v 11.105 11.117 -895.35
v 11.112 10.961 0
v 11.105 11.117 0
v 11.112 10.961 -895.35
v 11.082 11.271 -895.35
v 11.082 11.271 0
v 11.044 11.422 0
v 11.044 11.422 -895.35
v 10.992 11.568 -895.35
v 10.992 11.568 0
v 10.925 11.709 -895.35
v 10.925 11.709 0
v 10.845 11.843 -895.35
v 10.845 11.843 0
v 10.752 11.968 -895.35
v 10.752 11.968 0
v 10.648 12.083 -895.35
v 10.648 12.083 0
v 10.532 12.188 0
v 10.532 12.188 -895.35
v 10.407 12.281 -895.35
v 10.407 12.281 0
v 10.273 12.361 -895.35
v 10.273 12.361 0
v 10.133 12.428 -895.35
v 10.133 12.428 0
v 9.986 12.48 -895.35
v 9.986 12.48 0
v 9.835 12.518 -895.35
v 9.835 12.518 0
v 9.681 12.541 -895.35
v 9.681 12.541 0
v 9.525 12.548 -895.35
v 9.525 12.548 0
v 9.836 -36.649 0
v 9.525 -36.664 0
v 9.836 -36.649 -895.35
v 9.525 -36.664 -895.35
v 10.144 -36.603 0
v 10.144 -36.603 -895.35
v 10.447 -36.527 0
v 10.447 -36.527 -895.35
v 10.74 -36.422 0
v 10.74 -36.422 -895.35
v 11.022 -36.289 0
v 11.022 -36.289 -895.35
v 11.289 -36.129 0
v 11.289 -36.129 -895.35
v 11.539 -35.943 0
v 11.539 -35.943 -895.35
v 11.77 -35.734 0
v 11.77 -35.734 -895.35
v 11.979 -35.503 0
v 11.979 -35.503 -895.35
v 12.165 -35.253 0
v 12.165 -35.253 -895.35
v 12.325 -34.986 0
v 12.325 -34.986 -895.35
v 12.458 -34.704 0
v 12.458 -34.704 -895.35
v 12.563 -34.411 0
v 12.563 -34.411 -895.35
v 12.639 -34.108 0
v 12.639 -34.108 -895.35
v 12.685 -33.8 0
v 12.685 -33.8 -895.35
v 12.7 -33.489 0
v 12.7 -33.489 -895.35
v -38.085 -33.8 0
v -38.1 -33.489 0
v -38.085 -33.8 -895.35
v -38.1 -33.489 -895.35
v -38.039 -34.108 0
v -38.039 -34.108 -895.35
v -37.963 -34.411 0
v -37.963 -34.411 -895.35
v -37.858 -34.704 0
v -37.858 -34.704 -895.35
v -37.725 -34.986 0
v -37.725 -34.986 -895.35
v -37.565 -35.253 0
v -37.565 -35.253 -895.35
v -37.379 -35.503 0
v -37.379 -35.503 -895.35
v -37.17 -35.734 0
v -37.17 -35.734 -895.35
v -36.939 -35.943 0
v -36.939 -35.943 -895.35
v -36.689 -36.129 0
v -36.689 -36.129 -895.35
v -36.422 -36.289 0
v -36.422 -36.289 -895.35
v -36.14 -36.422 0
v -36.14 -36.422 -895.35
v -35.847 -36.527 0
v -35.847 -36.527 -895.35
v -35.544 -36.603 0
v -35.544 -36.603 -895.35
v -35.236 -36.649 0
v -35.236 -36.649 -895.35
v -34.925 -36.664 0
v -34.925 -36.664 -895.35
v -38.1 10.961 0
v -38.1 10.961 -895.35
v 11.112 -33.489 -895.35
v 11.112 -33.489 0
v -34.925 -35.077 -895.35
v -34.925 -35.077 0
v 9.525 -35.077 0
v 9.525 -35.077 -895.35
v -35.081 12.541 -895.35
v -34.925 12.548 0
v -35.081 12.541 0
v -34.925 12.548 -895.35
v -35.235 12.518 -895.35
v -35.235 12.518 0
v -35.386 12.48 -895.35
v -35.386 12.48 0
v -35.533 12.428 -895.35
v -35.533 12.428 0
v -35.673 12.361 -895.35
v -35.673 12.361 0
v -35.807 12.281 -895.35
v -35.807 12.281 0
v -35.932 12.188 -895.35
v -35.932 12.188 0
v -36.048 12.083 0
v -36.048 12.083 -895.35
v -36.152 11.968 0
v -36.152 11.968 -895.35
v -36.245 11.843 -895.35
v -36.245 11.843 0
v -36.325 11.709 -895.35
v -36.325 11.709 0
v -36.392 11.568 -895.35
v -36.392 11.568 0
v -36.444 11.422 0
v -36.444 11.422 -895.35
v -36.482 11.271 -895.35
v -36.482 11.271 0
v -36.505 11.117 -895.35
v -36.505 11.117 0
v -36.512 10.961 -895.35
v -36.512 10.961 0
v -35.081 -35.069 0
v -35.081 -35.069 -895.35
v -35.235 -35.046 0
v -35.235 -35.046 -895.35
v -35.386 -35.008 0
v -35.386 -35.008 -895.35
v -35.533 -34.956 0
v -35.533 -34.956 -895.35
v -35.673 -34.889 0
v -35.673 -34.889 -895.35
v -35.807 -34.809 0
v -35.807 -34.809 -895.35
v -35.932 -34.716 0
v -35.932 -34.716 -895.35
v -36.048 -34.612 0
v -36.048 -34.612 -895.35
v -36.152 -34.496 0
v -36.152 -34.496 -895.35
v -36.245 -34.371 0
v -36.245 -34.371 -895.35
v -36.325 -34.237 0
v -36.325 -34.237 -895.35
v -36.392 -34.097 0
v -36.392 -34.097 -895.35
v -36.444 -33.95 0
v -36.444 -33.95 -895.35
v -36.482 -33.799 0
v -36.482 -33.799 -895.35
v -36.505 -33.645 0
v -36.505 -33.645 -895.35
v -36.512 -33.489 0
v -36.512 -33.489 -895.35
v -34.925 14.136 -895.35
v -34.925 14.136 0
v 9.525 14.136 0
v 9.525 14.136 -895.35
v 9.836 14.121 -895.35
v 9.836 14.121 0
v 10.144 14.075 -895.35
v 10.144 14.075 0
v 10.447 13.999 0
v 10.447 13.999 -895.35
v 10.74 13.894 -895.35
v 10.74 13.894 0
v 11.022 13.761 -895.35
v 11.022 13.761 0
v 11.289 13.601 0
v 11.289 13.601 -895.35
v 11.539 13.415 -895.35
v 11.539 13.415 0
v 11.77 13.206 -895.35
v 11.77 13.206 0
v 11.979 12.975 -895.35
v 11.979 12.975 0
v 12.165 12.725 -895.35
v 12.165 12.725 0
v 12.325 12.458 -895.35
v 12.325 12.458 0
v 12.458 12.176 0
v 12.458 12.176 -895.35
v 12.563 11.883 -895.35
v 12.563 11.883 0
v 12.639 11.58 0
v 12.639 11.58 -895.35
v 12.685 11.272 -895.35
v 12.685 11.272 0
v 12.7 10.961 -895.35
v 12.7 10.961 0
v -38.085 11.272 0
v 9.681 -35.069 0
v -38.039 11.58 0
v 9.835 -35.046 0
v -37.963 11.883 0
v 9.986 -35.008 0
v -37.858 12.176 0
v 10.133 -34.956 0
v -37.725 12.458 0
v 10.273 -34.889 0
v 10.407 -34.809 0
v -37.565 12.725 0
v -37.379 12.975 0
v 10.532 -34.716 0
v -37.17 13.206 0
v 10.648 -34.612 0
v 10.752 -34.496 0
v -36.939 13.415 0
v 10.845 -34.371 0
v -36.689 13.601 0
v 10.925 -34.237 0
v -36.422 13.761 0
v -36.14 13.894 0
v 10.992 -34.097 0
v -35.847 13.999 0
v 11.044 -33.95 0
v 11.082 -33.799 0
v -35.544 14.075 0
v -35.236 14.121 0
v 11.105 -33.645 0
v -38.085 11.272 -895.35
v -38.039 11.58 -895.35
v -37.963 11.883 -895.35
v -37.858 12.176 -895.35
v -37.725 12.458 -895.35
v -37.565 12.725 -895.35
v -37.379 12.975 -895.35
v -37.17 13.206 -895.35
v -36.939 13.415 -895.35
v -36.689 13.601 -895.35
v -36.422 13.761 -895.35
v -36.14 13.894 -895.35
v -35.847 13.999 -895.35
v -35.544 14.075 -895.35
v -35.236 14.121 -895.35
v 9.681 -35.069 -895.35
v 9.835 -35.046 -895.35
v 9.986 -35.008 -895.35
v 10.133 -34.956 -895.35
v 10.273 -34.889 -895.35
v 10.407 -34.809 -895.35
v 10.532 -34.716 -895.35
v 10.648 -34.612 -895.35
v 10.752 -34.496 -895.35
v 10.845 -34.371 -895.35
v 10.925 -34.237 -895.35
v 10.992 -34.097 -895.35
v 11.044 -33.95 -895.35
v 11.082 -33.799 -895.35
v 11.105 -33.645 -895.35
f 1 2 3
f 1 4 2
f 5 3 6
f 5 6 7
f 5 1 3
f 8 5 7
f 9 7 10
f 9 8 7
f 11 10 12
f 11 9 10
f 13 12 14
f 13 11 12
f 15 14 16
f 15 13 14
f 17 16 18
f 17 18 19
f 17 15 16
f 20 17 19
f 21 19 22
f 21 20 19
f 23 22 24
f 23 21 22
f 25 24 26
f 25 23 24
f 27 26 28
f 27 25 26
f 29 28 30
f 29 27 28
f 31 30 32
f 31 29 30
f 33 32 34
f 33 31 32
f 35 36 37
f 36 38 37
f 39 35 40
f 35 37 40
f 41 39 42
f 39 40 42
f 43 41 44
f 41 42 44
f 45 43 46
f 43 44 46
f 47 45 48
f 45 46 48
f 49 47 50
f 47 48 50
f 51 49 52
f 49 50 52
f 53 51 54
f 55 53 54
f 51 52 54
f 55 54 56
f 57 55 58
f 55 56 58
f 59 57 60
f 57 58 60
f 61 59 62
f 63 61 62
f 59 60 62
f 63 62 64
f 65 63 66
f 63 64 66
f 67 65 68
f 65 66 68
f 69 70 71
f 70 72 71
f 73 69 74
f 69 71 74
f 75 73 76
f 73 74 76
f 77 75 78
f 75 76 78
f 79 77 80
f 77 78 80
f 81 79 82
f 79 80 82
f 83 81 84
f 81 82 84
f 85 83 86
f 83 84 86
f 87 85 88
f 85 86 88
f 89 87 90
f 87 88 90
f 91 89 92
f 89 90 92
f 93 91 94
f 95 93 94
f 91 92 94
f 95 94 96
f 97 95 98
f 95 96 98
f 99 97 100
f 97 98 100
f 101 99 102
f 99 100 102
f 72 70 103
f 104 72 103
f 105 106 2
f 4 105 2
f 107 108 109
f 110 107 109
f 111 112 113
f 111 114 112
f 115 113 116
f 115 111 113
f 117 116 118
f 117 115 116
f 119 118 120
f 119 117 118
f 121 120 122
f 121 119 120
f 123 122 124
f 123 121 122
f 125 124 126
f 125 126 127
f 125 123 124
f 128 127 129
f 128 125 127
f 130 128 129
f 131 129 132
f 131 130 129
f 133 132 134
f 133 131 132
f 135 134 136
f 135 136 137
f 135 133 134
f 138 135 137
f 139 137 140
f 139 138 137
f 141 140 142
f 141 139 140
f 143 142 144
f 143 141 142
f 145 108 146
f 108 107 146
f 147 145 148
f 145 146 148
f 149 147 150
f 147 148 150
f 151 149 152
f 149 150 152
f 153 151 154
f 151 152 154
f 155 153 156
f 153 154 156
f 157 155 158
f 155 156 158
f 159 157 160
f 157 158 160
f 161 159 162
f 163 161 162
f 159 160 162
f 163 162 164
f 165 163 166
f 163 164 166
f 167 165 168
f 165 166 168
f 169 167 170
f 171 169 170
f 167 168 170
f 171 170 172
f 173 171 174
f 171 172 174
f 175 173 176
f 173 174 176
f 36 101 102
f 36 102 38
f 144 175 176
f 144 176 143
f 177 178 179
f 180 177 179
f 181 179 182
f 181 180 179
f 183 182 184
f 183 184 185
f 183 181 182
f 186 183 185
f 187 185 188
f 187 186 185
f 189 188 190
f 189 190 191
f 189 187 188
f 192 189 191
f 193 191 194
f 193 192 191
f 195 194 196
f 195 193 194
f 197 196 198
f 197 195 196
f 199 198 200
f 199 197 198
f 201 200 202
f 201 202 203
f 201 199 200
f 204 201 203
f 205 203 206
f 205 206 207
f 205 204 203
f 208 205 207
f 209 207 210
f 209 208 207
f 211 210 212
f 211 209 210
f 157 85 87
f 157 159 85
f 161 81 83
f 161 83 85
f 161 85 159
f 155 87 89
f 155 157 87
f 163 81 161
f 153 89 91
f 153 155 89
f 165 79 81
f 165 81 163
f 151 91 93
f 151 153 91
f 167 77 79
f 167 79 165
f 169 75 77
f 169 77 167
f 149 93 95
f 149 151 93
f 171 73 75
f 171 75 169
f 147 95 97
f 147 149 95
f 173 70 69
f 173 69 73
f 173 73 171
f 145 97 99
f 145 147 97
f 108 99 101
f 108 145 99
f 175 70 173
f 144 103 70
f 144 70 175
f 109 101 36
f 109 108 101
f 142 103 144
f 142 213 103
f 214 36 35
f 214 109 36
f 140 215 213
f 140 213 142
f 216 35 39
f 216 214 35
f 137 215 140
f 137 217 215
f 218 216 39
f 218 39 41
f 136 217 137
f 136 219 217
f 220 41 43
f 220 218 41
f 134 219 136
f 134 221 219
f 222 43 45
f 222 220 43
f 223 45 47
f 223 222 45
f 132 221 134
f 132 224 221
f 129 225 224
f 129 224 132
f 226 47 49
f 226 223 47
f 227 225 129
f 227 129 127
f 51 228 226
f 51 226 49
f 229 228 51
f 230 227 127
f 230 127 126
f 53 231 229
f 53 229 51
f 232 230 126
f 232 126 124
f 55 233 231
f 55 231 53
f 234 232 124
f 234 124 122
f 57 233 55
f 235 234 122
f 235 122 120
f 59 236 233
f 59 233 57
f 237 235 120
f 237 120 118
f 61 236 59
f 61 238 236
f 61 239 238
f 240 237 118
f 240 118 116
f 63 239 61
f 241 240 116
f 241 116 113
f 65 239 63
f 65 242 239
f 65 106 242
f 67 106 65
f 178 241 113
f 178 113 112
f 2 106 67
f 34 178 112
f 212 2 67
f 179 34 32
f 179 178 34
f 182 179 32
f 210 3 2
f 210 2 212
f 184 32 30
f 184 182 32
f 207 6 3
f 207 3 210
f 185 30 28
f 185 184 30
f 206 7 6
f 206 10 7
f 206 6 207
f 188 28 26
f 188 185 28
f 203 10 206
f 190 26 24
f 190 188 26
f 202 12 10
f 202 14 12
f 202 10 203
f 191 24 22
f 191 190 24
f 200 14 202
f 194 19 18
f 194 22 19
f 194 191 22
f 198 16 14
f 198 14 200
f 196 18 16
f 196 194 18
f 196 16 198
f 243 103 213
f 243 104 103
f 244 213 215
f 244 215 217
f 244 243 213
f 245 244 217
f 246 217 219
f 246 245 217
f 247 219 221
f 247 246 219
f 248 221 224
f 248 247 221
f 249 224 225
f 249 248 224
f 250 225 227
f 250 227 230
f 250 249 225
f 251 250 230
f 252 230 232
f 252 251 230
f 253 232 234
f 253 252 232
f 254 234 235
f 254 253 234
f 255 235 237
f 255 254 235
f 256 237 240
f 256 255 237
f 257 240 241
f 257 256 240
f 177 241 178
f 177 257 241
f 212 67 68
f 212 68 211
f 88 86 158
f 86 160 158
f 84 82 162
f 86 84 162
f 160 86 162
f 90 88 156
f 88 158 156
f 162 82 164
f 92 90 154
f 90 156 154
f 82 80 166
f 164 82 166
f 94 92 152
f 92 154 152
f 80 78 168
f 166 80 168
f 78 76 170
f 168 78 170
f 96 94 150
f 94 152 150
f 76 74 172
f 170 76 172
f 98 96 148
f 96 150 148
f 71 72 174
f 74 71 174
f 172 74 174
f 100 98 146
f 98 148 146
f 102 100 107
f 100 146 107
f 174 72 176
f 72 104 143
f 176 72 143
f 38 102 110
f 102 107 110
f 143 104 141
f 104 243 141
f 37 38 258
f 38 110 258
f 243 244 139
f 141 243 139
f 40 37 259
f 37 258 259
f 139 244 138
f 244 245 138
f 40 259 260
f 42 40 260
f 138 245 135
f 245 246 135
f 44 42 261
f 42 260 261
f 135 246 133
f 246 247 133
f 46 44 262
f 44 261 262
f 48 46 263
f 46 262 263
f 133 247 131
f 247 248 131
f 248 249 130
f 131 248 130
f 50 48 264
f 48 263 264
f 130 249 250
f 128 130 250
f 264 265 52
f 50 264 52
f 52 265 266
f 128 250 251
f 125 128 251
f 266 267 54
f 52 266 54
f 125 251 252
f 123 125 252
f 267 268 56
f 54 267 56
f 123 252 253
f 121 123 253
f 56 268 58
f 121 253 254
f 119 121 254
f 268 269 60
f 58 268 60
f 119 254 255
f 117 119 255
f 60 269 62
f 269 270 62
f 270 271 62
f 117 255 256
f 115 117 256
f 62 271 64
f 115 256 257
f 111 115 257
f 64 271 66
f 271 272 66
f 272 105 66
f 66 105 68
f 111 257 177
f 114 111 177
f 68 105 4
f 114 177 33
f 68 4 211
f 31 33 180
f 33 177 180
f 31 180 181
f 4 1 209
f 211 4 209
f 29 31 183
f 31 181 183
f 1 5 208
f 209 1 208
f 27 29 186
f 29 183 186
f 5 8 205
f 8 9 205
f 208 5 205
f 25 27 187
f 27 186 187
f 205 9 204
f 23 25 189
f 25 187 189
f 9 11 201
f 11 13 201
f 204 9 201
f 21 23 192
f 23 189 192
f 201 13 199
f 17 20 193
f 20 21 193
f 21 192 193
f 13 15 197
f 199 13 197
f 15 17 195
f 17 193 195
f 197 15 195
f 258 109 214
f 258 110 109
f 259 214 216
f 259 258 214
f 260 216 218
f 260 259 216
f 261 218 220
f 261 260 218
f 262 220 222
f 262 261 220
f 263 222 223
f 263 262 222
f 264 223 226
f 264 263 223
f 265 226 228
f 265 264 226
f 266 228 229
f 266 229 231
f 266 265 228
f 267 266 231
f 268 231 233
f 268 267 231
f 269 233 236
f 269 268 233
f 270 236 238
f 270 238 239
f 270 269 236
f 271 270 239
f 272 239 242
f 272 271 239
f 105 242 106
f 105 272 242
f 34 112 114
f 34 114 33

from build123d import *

# Parameters (mm, degrees)
F0_W     = 50.8
F0_H     = 50.8
F0_W_2   = 47.625
F0_H_2   = 47.625
F1_DEPTH = 895.35
F2_R     = 3.175
F3_R     = 1.5875


with BuildPart() as f1:
    # F0 (on Top) → F1 (new body)
    with BuildSketch(Plane.XY):
        with Locations((-12.7, -11.264074)):
            Rectangle(F0_W, F0_H)
        with Locations((-12.7, -11.264074)):
            Rectangle(F0_W_2, F0_H_2, mode=Mode.SUBTRACT)
    extrude(amount=-F1_DEPTH)

    # F2
    f2_edges = [f1.edges().sort_by_distance(p)[0] for p in [
        (-38.1, -36.664074, -447.675),
        (12.7, -36.664074, -447.675),
        (12.7, 14.135926, -447.675),
        (-38.1, 14.135926, -447.675),
    ]]
    fillet(f2_edges, radius=F2_R)

    # F3
    f3_edges = [f1.edges().sort_by_distance(p)[0] for p in [
        (-36.5125, 12.548426, -447.675),
        (11.1125, 12.548426, -447.675),
        (11.1125, -35.076574, -447.675),
        (-36.5125, -35.076574, -447.675),
    ]]
    fillet(f3_edges, radius=F3_R)


solid = f1.part
